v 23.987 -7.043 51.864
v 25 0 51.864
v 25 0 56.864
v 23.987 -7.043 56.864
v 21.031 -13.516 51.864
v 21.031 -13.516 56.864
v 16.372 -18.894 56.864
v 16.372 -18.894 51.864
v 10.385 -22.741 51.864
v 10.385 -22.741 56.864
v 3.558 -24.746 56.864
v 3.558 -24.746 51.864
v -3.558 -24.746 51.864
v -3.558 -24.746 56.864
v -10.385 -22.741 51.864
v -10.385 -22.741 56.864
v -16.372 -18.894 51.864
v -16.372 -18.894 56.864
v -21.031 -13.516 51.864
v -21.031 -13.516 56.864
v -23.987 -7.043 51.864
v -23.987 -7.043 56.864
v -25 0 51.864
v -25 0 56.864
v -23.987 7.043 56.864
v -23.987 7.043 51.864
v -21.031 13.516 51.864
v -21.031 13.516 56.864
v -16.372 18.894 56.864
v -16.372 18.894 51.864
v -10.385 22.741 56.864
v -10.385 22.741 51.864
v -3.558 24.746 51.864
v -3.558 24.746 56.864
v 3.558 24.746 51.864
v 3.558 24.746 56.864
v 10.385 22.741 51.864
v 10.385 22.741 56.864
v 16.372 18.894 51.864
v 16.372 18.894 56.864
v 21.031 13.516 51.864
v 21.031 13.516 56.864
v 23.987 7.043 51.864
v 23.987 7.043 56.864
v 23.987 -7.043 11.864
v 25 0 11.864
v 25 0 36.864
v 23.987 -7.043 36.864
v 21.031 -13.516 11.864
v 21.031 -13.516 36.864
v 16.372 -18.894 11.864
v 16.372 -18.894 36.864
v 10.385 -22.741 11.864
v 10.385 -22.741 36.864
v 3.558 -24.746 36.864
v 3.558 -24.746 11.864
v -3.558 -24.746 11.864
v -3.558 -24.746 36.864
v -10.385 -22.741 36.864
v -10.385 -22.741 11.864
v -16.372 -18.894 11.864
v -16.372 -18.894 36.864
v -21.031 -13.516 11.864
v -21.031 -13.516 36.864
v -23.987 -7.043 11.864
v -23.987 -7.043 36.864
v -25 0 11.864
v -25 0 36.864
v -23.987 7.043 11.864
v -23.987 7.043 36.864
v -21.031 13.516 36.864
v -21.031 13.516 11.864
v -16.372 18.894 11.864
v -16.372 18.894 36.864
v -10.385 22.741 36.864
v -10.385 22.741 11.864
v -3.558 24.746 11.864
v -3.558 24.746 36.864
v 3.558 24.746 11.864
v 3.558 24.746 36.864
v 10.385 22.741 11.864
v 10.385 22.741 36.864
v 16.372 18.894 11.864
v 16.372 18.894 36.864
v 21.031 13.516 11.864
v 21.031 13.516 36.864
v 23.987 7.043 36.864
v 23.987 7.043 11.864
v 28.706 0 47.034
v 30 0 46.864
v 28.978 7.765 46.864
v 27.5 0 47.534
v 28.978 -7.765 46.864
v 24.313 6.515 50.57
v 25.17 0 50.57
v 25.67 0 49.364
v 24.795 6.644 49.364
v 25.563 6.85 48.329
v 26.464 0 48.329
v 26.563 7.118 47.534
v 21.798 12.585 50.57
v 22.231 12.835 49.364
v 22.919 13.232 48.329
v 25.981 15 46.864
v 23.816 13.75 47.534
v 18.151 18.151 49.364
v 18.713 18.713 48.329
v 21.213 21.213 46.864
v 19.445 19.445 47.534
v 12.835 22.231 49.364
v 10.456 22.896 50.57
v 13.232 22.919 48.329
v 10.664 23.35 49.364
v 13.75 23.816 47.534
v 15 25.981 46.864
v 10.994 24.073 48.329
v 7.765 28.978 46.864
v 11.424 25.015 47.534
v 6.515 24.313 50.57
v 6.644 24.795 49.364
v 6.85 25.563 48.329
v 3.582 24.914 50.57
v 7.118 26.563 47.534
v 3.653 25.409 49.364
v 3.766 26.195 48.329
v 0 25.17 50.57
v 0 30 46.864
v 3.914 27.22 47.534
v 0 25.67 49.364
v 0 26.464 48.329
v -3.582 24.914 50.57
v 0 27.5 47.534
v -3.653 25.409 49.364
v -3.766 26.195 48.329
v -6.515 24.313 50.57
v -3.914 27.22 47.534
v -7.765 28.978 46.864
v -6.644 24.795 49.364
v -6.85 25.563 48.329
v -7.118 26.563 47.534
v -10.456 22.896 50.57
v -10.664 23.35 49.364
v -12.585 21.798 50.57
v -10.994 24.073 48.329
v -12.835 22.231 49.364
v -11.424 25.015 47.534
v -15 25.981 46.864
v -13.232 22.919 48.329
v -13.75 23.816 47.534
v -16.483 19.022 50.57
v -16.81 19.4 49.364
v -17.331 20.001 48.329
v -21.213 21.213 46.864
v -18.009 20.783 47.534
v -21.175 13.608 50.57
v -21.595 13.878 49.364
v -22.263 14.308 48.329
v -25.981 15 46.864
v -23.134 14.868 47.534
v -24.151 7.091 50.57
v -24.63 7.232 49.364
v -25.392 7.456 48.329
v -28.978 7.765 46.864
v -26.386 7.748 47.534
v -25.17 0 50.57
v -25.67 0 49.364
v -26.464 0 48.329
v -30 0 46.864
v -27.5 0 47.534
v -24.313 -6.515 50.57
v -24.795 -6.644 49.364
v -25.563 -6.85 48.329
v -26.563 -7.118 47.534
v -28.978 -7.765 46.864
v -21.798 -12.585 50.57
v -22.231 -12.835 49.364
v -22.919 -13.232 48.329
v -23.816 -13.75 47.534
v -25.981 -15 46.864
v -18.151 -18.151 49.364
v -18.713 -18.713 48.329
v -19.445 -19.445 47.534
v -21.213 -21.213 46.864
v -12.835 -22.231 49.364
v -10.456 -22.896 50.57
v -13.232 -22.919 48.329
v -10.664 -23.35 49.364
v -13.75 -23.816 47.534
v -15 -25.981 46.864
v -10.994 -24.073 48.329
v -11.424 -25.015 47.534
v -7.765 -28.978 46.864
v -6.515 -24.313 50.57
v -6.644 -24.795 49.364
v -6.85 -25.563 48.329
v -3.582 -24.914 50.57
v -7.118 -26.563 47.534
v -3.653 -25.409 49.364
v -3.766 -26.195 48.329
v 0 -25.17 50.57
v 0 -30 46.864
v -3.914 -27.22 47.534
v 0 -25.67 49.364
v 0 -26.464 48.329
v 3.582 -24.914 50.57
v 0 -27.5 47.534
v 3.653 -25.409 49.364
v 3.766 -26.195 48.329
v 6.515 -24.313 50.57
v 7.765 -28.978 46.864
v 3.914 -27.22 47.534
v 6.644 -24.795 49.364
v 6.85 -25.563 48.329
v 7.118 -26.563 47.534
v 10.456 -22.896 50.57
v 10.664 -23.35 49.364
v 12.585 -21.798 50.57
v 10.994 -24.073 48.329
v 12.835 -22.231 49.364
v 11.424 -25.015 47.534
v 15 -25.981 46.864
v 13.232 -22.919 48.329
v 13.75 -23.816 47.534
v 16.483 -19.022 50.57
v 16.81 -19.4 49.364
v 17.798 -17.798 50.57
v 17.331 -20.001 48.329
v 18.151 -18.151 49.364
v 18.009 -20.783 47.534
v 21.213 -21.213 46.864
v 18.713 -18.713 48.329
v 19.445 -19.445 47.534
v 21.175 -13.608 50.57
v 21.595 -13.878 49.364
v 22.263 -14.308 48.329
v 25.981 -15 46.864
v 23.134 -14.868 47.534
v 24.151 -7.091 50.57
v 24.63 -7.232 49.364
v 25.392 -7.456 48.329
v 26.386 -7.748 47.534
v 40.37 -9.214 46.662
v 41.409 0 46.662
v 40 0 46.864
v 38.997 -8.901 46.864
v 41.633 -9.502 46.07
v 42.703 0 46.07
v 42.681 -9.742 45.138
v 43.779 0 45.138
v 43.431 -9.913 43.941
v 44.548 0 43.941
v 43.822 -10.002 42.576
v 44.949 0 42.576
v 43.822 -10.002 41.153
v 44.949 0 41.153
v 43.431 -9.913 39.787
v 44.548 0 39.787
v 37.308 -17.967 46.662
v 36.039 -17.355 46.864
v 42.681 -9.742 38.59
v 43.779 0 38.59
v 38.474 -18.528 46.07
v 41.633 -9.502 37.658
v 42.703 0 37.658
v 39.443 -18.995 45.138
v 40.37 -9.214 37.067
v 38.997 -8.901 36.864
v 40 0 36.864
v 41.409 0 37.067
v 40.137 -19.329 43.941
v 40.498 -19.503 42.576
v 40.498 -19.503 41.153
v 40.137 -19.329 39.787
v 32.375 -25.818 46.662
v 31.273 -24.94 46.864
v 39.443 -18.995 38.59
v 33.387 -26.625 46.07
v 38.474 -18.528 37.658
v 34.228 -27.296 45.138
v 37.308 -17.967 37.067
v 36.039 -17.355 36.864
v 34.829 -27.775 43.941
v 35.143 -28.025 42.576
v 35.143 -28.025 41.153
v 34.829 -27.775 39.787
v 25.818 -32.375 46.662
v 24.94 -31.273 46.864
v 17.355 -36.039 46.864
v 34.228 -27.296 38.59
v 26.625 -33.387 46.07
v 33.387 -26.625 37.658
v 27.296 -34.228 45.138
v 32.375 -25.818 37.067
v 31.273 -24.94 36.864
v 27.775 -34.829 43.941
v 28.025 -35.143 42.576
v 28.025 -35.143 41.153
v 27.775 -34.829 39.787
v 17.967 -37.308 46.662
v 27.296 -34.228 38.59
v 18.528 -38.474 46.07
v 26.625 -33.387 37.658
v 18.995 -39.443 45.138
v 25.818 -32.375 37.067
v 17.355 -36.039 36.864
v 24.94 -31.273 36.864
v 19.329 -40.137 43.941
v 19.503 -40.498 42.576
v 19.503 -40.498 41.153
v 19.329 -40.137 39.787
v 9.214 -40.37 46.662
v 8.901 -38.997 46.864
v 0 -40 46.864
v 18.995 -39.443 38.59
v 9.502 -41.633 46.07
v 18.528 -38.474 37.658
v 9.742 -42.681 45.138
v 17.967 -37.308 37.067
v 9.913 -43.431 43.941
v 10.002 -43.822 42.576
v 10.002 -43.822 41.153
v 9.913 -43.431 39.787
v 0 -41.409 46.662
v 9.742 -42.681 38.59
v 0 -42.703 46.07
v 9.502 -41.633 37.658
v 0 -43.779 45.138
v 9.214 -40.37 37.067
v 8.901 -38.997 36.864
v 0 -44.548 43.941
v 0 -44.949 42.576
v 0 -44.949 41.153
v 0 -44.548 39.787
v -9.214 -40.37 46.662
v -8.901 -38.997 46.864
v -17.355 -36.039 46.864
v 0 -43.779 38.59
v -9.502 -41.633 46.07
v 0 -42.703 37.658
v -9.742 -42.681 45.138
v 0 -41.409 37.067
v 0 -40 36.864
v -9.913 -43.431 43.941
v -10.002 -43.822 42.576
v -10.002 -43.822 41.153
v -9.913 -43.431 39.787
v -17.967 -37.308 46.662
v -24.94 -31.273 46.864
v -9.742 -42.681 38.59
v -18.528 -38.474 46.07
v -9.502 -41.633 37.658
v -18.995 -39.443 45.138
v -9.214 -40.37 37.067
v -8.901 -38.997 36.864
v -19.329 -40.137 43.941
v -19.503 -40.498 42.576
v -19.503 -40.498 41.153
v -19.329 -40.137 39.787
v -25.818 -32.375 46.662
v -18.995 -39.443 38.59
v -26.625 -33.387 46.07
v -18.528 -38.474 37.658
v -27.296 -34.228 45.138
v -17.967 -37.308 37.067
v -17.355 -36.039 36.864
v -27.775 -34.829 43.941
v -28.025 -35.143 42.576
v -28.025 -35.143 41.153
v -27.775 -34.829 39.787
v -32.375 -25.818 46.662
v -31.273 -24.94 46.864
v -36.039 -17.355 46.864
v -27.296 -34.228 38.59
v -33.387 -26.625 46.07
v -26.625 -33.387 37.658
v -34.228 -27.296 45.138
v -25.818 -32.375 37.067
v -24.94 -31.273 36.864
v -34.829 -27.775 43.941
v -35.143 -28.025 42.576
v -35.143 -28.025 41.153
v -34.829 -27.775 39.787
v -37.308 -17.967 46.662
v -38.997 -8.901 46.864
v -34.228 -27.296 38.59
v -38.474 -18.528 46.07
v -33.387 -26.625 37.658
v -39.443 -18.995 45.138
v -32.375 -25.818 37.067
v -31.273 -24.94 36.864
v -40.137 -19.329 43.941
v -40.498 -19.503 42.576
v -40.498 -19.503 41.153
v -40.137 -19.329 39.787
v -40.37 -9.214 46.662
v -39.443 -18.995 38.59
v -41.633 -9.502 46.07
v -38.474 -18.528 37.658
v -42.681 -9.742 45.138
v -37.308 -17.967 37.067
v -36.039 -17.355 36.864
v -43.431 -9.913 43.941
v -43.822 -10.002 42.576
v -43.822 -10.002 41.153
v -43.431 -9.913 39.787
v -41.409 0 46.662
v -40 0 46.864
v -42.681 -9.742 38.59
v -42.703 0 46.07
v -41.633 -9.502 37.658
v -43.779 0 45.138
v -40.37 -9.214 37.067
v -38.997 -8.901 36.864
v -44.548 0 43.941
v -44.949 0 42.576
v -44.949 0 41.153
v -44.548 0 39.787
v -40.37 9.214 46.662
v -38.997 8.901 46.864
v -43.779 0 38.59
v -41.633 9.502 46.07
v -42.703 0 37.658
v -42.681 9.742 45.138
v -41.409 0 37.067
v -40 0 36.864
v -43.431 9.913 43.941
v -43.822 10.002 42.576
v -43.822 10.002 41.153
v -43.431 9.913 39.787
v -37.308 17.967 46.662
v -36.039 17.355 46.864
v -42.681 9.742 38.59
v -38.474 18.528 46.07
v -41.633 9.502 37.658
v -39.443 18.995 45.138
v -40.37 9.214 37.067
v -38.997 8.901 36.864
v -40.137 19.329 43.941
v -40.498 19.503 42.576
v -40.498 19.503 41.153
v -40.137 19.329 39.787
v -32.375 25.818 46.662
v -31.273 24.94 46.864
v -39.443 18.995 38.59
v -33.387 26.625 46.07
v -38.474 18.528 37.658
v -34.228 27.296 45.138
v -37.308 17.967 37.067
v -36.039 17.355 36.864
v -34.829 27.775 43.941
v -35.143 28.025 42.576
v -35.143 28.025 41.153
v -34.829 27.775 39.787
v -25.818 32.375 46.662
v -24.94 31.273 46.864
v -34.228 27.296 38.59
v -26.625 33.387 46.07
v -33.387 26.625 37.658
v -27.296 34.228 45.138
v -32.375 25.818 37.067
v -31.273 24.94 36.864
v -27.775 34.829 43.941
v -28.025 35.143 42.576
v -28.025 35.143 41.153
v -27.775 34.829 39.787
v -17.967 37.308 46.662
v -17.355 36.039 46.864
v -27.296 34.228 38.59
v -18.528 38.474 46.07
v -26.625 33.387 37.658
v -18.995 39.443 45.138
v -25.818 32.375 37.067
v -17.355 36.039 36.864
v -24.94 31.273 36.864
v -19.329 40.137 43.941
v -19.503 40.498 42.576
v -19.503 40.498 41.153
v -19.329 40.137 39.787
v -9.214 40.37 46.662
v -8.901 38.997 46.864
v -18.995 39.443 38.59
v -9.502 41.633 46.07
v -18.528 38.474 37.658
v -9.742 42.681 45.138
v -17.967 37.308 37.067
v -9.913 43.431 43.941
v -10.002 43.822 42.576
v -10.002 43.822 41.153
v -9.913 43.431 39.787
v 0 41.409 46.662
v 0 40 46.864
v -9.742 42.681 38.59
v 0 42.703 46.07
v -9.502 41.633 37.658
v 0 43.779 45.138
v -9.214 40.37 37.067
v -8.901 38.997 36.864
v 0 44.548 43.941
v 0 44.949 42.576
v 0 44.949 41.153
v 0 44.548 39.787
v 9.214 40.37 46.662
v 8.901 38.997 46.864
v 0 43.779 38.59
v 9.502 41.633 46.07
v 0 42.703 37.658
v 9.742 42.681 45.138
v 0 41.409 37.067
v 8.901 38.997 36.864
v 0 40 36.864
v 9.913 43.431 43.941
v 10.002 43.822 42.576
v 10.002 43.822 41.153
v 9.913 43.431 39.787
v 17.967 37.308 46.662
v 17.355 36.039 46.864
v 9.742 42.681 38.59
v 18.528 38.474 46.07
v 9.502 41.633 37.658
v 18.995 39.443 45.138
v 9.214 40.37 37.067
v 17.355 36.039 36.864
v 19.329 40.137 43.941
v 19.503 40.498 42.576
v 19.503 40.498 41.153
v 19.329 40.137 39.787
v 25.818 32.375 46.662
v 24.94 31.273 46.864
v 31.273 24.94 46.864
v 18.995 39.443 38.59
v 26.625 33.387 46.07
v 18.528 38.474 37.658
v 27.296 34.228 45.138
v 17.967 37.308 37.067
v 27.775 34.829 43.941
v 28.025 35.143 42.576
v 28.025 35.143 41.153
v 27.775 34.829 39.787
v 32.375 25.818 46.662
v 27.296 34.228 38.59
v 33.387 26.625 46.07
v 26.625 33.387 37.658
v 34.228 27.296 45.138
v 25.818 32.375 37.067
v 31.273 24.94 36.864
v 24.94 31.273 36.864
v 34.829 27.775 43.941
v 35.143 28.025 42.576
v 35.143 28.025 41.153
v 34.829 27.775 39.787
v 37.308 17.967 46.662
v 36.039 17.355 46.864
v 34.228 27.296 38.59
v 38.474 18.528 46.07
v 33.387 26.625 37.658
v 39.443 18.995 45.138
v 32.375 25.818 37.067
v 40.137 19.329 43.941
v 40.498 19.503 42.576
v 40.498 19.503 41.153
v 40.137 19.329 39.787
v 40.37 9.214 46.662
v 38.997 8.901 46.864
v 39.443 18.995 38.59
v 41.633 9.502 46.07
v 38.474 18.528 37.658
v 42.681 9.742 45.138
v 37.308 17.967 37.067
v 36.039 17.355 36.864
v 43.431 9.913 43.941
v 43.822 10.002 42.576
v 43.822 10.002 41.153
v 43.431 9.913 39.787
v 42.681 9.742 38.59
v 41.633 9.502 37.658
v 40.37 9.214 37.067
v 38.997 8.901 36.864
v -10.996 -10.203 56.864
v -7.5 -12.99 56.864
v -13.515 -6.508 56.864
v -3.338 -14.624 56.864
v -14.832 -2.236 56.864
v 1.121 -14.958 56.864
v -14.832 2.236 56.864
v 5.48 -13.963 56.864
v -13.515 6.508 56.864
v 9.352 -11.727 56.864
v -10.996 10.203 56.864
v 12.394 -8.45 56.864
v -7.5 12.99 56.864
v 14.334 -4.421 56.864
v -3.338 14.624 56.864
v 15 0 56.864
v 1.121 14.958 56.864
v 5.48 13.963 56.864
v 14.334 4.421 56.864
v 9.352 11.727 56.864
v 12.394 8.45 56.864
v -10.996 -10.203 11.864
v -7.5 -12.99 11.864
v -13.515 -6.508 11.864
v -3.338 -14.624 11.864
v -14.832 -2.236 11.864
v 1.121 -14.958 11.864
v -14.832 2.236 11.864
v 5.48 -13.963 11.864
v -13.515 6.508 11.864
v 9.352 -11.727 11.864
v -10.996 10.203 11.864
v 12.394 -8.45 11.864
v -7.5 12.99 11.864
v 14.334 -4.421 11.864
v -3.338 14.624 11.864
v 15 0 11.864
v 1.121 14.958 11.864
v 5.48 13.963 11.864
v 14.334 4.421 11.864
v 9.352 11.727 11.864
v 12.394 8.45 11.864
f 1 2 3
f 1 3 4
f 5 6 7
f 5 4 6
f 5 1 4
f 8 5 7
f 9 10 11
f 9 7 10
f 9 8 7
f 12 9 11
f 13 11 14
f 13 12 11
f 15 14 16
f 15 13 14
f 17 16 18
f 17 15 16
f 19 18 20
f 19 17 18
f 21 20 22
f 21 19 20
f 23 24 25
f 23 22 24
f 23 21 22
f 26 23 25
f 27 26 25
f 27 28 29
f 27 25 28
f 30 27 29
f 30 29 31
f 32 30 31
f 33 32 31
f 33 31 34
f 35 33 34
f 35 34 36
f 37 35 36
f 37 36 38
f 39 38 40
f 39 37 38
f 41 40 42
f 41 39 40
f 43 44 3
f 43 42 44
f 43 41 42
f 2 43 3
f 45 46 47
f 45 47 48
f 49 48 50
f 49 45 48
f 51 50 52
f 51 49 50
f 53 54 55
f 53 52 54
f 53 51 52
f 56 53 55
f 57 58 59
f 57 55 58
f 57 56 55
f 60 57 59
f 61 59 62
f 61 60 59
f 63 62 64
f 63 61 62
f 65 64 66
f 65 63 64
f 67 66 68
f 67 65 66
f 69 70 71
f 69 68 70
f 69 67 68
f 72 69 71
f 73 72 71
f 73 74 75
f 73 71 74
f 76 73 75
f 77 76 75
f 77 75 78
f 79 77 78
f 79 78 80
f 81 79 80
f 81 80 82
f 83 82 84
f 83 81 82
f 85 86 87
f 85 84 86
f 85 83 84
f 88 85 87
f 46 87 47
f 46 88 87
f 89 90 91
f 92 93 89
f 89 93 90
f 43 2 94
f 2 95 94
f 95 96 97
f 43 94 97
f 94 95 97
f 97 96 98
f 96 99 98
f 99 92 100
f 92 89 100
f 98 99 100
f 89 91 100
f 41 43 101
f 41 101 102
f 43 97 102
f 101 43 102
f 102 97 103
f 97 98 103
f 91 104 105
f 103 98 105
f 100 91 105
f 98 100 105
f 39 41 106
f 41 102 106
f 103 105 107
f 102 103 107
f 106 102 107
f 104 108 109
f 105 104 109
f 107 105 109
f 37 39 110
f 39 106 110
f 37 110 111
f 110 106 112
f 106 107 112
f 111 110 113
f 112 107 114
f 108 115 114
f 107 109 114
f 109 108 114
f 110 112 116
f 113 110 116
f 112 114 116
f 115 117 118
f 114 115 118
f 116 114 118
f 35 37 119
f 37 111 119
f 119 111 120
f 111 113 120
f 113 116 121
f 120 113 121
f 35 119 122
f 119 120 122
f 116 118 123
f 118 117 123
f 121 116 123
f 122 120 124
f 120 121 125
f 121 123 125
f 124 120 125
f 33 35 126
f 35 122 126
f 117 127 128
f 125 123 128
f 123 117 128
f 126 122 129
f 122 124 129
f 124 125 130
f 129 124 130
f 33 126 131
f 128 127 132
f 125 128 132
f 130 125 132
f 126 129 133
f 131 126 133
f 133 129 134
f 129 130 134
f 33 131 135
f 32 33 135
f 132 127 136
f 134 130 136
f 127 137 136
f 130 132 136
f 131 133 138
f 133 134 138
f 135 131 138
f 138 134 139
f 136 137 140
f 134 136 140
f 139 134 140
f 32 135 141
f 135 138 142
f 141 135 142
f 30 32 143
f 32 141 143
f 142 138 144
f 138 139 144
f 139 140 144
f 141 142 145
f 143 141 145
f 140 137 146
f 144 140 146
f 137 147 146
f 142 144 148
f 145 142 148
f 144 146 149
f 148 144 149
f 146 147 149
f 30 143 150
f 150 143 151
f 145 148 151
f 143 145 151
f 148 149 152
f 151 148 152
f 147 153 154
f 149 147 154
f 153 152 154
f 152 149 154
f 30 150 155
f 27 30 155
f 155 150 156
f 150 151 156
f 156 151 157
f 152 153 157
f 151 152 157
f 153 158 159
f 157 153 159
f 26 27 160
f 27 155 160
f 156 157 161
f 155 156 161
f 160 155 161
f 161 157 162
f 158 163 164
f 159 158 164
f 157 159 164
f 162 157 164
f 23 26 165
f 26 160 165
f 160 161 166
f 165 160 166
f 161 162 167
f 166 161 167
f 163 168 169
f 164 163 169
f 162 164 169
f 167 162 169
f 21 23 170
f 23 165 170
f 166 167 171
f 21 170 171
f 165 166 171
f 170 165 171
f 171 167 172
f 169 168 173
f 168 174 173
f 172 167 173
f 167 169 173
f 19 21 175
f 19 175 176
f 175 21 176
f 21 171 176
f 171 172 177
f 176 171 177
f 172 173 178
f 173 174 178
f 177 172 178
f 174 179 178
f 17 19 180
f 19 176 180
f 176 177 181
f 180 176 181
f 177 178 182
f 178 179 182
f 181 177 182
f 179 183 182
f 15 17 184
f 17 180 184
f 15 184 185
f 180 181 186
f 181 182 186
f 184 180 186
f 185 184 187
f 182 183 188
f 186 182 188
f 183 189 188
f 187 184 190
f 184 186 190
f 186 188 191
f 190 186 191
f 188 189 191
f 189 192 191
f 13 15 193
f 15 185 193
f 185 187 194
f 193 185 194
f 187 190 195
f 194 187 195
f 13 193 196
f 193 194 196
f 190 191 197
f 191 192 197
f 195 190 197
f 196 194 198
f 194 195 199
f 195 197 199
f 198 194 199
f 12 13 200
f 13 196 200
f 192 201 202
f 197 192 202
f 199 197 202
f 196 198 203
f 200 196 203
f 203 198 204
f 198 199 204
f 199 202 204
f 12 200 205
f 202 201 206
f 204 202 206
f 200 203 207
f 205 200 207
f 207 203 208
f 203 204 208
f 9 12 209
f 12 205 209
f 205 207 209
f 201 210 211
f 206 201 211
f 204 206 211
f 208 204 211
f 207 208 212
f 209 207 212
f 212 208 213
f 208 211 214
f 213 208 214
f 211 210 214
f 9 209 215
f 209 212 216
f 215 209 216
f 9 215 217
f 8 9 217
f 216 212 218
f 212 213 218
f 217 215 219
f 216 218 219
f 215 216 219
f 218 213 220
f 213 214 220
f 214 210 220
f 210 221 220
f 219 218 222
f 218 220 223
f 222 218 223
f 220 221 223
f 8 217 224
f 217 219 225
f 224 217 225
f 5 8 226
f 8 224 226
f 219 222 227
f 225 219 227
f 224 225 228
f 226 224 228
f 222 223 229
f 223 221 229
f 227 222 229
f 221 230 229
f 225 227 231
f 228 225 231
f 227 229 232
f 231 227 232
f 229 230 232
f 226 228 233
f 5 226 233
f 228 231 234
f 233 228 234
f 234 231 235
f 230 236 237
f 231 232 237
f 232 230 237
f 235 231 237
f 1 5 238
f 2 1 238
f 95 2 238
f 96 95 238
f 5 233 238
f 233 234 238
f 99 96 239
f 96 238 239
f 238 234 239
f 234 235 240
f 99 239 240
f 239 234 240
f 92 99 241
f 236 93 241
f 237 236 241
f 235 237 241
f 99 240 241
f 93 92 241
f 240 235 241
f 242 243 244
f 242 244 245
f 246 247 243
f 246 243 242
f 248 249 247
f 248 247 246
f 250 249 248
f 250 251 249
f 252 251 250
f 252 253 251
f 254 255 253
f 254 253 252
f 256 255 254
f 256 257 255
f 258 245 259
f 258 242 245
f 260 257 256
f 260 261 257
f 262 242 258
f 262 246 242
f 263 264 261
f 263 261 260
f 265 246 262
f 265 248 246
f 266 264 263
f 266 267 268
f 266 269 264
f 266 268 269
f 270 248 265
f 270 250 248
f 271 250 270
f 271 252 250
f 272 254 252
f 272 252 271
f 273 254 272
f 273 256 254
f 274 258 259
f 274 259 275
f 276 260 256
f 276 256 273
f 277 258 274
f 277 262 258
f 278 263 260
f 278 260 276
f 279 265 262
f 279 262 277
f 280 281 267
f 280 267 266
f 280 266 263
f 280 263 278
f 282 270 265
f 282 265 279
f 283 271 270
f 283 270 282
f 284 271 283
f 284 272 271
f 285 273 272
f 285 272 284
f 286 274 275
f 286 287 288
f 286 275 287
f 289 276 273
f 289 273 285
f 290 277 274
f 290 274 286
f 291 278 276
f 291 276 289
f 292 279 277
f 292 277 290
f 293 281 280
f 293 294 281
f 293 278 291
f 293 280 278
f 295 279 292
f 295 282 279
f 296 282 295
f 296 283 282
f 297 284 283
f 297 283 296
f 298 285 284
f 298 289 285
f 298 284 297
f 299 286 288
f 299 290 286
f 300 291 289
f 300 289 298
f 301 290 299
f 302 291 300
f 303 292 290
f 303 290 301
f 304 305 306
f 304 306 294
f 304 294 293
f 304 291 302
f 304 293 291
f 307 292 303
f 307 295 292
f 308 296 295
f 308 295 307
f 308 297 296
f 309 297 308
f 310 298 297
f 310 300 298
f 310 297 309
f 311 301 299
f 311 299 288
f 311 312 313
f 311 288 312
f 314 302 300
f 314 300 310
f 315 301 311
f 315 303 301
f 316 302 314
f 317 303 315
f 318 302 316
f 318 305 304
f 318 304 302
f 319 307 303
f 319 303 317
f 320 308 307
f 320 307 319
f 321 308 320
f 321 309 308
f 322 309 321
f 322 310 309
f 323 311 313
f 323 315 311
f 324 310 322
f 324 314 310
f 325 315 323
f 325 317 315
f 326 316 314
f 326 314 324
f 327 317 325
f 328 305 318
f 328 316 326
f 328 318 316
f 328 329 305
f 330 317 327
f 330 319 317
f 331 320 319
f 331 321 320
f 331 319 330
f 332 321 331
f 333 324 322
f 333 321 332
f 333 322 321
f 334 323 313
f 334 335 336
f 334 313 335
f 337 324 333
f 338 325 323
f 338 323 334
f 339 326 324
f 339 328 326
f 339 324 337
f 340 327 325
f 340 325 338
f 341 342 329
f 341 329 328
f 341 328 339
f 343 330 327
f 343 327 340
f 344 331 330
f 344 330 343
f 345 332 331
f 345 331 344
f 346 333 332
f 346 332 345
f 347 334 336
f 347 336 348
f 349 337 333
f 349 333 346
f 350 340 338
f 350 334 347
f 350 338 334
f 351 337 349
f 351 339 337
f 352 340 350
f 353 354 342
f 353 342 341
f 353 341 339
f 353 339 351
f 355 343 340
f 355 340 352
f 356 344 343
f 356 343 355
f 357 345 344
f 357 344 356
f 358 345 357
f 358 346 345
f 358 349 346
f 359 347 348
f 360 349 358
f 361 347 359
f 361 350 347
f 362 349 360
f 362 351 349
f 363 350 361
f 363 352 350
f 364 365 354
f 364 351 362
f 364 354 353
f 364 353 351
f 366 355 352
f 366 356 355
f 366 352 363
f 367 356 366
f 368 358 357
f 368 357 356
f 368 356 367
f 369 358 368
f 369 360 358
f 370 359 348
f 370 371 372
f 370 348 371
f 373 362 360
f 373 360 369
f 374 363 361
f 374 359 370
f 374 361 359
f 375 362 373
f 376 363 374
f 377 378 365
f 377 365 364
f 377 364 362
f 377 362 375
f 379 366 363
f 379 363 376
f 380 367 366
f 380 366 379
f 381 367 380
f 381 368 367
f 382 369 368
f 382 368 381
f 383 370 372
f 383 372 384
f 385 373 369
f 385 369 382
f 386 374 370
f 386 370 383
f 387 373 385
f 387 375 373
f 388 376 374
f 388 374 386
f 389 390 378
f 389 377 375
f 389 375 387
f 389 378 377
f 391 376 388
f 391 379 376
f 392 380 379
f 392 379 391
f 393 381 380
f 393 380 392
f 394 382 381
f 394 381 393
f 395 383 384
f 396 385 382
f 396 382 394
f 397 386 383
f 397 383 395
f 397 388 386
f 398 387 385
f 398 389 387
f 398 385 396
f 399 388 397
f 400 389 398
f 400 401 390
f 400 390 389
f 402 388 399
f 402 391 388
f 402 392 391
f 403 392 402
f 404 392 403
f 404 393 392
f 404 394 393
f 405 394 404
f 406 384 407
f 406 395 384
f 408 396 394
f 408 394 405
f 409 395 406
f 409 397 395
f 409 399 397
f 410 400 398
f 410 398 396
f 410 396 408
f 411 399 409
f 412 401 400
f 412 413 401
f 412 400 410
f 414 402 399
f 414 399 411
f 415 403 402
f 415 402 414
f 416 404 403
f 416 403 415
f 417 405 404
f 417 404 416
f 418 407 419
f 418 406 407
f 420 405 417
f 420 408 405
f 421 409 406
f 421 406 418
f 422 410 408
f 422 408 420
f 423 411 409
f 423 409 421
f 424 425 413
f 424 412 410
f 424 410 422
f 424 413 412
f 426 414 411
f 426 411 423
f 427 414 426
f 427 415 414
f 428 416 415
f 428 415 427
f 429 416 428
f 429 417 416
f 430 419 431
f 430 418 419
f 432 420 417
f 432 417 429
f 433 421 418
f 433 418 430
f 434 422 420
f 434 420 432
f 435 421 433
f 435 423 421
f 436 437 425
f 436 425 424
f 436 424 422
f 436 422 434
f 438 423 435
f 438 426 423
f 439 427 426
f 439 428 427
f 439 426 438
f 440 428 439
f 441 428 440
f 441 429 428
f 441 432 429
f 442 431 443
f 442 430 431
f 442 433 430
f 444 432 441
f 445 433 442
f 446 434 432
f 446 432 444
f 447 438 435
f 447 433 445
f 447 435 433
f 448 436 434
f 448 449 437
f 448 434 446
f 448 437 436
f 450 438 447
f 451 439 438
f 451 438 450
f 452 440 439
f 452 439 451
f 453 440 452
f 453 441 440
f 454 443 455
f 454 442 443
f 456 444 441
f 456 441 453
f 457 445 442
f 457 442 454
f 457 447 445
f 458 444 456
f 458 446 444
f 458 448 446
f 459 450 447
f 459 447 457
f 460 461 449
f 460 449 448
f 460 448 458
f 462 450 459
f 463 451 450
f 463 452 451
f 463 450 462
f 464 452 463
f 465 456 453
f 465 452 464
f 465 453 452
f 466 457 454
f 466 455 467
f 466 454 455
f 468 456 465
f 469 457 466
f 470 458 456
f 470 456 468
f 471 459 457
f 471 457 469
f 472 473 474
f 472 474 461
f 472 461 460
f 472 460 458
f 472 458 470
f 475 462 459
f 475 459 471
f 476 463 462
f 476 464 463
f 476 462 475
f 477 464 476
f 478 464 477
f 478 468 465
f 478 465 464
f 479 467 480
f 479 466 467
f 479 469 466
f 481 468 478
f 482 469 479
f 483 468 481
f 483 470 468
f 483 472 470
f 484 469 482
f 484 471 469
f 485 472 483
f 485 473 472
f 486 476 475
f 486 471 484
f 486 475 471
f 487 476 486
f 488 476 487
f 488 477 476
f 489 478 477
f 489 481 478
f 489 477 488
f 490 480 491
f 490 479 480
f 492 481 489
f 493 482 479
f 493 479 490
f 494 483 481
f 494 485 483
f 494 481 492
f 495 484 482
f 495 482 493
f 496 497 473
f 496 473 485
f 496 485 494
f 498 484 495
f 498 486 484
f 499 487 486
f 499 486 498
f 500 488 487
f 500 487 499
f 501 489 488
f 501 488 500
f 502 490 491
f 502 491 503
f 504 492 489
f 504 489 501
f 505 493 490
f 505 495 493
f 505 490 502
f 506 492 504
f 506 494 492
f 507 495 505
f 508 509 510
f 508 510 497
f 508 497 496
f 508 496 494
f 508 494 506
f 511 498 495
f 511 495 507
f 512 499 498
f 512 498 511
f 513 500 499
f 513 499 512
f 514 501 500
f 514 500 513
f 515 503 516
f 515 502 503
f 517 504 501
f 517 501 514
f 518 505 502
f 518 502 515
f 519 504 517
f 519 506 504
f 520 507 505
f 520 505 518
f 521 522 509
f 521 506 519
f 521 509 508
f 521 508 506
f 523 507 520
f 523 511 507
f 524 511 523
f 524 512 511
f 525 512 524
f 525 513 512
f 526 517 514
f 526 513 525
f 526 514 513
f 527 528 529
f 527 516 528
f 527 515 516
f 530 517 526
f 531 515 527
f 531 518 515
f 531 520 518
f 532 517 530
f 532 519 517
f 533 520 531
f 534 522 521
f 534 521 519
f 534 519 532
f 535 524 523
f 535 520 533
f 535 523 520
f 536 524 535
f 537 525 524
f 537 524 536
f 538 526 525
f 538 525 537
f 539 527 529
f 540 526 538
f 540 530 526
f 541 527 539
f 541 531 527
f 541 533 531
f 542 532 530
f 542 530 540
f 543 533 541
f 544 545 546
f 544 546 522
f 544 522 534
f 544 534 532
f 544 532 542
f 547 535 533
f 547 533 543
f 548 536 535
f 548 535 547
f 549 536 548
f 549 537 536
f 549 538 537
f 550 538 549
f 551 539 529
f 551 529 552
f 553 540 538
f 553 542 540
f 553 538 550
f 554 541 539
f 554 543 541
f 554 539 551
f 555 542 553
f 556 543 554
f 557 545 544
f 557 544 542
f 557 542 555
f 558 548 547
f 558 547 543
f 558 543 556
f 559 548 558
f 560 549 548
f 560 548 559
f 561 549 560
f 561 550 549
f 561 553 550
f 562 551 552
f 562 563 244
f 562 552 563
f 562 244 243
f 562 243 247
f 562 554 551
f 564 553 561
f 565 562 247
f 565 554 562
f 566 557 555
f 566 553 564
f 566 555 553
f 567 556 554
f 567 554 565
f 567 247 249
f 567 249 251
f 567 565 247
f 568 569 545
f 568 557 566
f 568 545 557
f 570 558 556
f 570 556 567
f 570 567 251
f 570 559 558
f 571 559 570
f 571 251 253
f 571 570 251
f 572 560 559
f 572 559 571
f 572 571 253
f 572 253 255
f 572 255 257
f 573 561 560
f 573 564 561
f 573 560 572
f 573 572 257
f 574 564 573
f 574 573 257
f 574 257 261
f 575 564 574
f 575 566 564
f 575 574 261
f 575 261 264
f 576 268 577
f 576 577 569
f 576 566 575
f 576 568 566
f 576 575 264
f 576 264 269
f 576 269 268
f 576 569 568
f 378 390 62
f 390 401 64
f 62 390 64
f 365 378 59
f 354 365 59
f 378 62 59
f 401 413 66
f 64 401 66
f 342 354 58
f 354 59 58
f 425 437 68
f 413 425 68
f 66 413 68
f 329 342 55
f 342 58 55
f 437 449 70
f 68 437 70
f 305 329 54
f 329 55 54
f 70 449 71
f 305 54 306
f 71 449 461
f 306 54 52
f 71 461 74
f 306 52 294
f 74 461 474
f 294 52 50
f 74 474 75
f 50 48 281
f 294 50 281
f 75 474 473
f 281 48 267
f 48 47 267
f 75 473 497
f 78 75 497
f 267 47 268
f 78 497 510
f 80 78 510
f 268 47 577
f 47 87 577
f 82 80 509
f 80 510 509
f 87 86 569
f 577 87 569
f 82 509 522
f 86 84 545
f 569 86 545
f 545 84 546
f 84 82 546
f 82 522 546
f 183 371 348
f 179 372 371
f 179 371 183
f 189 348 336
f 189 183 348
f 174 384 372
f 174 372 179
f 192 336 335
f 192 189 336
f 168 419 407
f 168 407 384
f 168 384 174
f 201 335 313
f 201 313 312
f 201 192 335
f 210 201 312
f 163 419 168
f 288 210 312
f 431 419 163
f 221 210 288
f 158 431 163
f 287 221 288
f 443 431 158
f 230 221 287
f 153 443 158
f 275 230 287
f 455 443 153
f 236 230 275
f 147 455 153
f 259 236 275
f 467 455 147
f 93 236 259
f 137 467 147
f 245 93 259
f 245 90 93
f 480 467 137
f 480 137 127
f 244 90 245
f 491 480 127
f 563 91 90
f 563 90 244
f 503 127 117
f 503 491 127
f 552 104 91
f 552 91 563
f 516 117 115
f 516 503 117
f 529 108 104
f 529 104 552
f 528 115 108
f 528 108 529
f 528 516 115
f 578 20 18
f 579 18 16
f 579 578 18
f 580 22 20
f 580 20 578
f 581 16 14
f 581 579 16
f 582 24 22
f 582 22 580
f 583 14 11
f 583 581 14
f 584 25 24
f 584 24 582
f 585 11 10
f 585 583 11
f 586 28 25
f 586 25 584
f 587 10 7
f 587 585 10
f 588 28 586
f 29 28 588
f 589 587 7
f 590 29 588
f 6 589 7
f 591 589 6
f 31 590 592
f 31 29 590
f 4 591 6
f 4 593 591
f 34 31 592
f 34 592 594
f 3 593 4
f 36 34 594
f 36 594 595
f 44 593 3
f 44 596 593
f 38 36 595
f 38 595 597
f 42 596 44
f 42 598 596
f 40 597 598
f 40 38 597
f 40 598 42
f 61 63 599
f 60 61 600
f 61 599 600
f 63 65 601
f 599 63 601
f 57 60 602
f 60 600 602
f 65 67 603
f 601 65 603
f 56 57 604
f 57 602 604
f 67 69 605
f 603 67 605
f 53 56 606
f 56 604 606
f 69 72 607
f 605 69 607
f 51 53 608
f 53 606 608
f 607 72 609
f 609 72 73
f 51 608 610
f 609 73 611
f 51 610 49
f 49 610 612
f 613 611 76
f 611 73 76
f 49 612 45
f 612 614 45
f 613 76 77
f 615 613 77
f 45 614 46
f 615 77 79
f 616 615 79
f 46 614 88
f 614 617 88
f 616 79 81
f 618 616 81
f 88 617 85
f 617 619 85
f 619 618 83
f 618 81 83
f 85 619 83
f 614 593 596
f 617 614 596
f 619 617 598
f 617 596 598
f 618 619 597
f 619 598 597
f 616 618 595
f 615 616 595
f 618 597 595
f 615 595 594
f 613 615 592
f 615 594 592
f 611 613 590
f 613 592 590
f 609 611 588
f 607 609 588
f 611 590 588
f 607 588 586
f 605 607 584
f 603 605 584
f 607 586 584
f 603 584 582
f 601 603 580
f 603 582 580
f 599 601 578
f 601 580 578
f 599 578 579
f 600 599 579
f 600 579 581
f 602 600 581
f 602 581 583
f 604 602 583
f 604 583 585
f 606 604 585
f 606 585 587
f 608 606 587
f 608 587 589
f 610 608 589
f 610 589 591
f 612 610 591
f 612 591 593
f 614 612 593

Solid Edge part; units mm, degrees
sketch "Sketch1" plane through (0, 0, 0) normal (0, -1, 0) x (1, 0, 0)
  arc A0 (25, 51.8641) -> (30, 46.8641) centre (30, 51.8641) ccw
  line L0 (30, 46.8641) -> (40, 46.8641)
  arc A1 (40, 46.8641) -> (40, 36.8641) centre (40, 41.8641) cw
  line L1 (40, 36.8641) -> (25, 36.8641)
  line L2 (25, 36.8641) -> (25, 11.8641)
  line L3 (25, 11.8641) -> (15, 11.8641)
  line L4 (15, 11.8641) -> (15, 56.8641)
  line L5 (15, 56.8641) -> (25, 56.8641)
  line L6 (25, 56.8641) -> (25, 51.8641)
revolve "RevolvedProtrusion1" add sketch "Sketch1" angle 360 about axis through (0, 0, 0) along (0, 0, 1)
